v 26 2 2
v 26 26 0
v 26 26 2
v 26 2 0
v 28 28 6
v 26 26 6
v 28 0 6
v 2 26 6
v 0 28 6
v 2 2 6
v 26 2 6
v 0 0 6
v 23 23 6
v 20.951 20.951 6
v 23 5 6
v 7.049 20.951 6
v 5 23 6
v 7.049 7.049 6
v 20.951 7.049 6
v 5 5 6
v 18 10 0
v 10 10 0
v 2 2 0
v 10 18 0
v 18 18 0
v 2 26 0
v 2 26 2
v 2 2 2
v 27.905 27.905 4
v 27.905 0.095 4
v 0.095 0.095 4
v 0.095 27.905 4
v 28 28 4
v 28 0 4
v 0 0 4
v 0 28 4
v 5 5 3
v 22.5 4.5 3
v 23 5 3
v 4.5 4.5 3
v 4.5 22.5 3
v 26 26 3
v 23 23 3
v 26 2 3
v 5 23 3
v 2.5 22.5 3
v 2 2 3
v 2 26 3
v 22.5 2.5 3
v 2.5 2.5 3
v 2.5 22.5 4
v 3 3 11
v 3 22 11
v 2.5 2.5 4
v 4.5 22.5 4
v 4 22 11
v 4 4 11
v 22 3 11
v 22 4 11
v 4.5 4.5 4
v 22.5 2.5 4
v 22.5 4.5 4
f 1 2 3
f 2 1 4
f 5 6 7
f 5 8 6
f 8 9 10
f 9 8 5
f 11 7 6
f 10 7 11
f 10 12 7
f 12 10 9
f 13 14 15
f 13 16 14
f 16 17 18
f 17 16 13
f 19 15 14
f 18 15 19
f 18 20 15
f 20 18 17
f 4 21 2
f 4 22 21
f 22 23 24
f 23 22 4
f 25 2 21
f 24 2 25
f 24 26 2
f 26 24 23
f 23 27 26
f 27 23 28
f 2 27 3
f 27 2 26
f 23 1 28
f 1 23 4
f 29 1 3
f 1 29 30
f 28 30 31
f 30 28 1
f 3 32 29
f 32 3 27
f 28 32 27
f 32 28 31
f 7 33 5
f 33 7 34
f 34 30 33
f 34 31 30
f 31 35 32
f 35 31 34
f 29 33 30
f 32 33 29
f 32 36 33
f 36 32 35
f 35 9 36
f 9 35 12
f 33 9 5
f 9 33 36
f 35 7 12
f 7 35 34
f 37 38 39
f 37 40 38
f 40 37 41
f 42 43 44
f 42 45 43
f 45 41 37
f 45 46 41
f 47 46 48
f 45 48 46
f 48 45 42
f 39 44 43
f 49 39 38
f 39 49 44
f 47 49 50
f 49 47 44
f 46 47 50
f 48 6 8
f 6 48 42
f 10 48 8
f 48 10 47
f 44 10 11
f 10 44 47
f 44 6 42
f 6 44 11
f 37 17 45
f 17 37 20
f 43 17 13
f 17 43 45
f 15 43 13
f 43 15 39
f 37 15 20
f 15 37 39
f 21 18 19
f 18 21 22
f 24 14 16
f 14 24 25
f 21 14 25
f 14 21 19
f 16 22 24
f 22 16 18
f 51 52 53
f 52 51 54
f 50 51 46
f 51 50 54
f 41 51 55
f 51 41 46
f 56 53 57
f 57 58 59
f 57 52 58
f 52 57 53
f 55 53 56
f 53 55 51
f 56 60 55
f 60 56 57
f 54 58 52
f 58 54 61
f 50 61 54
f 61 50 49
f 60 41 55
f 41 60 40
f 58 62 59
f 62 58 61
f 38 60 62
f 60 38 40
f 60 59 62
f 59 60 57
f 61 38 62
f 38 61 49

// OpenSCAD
//(c) 2014 Felipe Sanches <fsanches@metamaquina.com.br>
// Released to the public domain

module ELE(l, L, h=1, H=8, bevel=0.5){

	//primeira parede
	hull(){
		linear_extrude(height=h)
		square([l, L]);

		linear_extrude(height=H)
		translate([bevel, bevel])
		square([l - 2*bevel, L - 2*bevel]);
	}

	//segunda parede
	hull(){
		linear_extrude(height=h)
		square([L, l]);

		linear_extrude(height=H)
		translate([bevel, bevel])
		square([L - 2*bevel, l - 2*bevel]);
	}
}


module sulco_2d(l, L, folga){
	difference(){
		translate([-folga/2, -folga/2])
		square([L+l+folga, L+l+folga]);

		translate([l,l])
		square([L-l, L-l]);
	}
}

l = 2;
L = 20;
altura = 6;
borda = 3;
profundidade = 3;
lado = l+L+2*borda;
folga = 2;
epsilon = 0.1;

H_sacada = 2;
sacada = 2;

module celula(){
	render()
	difference(){
		union(){
			translate([sacada,sacada])
			cube([lado-2*sacada, lado-2*sacada, altura]);
	
			translate([0,0,H_sacada])
			furo_para_carta(L+l+2*borda, altura=H_sacada, bevel=2*sacada);

			translate([0,0,2*H_sacada])
			cube([lado, lado, altura - 2*H_sacada]);		
		}

		translate([borda, borda, altura-profundidade])
		linear_extrude(height=profundidade+1)
		sulco_2d(l, L, folga);

		//translate([borda+2*l, borda+2*l	])
		//cube([L-3*l, L-3*l, altura+epsilon]);
	
		translate([borda+2*l, borda+2*l])
		furo_para_carta(L-3*l, altura, bevel=altura);
	}
}

module furo_para_carta(R, altura, bevel=2){
	translate([R/2,R/2])
	rotate(45)
	cylinder(r2=R/sqrt(2), r1=(R-bevel)/sqrt(2),
			 h=altura+epsilon, $fn=4);

}



color("grey")
celula();

color("white")
translate([borda-folga/4, borda-folga/4,altura-profundidade])
ELE(l, L, h=1, H=8, bevel=0.5);
